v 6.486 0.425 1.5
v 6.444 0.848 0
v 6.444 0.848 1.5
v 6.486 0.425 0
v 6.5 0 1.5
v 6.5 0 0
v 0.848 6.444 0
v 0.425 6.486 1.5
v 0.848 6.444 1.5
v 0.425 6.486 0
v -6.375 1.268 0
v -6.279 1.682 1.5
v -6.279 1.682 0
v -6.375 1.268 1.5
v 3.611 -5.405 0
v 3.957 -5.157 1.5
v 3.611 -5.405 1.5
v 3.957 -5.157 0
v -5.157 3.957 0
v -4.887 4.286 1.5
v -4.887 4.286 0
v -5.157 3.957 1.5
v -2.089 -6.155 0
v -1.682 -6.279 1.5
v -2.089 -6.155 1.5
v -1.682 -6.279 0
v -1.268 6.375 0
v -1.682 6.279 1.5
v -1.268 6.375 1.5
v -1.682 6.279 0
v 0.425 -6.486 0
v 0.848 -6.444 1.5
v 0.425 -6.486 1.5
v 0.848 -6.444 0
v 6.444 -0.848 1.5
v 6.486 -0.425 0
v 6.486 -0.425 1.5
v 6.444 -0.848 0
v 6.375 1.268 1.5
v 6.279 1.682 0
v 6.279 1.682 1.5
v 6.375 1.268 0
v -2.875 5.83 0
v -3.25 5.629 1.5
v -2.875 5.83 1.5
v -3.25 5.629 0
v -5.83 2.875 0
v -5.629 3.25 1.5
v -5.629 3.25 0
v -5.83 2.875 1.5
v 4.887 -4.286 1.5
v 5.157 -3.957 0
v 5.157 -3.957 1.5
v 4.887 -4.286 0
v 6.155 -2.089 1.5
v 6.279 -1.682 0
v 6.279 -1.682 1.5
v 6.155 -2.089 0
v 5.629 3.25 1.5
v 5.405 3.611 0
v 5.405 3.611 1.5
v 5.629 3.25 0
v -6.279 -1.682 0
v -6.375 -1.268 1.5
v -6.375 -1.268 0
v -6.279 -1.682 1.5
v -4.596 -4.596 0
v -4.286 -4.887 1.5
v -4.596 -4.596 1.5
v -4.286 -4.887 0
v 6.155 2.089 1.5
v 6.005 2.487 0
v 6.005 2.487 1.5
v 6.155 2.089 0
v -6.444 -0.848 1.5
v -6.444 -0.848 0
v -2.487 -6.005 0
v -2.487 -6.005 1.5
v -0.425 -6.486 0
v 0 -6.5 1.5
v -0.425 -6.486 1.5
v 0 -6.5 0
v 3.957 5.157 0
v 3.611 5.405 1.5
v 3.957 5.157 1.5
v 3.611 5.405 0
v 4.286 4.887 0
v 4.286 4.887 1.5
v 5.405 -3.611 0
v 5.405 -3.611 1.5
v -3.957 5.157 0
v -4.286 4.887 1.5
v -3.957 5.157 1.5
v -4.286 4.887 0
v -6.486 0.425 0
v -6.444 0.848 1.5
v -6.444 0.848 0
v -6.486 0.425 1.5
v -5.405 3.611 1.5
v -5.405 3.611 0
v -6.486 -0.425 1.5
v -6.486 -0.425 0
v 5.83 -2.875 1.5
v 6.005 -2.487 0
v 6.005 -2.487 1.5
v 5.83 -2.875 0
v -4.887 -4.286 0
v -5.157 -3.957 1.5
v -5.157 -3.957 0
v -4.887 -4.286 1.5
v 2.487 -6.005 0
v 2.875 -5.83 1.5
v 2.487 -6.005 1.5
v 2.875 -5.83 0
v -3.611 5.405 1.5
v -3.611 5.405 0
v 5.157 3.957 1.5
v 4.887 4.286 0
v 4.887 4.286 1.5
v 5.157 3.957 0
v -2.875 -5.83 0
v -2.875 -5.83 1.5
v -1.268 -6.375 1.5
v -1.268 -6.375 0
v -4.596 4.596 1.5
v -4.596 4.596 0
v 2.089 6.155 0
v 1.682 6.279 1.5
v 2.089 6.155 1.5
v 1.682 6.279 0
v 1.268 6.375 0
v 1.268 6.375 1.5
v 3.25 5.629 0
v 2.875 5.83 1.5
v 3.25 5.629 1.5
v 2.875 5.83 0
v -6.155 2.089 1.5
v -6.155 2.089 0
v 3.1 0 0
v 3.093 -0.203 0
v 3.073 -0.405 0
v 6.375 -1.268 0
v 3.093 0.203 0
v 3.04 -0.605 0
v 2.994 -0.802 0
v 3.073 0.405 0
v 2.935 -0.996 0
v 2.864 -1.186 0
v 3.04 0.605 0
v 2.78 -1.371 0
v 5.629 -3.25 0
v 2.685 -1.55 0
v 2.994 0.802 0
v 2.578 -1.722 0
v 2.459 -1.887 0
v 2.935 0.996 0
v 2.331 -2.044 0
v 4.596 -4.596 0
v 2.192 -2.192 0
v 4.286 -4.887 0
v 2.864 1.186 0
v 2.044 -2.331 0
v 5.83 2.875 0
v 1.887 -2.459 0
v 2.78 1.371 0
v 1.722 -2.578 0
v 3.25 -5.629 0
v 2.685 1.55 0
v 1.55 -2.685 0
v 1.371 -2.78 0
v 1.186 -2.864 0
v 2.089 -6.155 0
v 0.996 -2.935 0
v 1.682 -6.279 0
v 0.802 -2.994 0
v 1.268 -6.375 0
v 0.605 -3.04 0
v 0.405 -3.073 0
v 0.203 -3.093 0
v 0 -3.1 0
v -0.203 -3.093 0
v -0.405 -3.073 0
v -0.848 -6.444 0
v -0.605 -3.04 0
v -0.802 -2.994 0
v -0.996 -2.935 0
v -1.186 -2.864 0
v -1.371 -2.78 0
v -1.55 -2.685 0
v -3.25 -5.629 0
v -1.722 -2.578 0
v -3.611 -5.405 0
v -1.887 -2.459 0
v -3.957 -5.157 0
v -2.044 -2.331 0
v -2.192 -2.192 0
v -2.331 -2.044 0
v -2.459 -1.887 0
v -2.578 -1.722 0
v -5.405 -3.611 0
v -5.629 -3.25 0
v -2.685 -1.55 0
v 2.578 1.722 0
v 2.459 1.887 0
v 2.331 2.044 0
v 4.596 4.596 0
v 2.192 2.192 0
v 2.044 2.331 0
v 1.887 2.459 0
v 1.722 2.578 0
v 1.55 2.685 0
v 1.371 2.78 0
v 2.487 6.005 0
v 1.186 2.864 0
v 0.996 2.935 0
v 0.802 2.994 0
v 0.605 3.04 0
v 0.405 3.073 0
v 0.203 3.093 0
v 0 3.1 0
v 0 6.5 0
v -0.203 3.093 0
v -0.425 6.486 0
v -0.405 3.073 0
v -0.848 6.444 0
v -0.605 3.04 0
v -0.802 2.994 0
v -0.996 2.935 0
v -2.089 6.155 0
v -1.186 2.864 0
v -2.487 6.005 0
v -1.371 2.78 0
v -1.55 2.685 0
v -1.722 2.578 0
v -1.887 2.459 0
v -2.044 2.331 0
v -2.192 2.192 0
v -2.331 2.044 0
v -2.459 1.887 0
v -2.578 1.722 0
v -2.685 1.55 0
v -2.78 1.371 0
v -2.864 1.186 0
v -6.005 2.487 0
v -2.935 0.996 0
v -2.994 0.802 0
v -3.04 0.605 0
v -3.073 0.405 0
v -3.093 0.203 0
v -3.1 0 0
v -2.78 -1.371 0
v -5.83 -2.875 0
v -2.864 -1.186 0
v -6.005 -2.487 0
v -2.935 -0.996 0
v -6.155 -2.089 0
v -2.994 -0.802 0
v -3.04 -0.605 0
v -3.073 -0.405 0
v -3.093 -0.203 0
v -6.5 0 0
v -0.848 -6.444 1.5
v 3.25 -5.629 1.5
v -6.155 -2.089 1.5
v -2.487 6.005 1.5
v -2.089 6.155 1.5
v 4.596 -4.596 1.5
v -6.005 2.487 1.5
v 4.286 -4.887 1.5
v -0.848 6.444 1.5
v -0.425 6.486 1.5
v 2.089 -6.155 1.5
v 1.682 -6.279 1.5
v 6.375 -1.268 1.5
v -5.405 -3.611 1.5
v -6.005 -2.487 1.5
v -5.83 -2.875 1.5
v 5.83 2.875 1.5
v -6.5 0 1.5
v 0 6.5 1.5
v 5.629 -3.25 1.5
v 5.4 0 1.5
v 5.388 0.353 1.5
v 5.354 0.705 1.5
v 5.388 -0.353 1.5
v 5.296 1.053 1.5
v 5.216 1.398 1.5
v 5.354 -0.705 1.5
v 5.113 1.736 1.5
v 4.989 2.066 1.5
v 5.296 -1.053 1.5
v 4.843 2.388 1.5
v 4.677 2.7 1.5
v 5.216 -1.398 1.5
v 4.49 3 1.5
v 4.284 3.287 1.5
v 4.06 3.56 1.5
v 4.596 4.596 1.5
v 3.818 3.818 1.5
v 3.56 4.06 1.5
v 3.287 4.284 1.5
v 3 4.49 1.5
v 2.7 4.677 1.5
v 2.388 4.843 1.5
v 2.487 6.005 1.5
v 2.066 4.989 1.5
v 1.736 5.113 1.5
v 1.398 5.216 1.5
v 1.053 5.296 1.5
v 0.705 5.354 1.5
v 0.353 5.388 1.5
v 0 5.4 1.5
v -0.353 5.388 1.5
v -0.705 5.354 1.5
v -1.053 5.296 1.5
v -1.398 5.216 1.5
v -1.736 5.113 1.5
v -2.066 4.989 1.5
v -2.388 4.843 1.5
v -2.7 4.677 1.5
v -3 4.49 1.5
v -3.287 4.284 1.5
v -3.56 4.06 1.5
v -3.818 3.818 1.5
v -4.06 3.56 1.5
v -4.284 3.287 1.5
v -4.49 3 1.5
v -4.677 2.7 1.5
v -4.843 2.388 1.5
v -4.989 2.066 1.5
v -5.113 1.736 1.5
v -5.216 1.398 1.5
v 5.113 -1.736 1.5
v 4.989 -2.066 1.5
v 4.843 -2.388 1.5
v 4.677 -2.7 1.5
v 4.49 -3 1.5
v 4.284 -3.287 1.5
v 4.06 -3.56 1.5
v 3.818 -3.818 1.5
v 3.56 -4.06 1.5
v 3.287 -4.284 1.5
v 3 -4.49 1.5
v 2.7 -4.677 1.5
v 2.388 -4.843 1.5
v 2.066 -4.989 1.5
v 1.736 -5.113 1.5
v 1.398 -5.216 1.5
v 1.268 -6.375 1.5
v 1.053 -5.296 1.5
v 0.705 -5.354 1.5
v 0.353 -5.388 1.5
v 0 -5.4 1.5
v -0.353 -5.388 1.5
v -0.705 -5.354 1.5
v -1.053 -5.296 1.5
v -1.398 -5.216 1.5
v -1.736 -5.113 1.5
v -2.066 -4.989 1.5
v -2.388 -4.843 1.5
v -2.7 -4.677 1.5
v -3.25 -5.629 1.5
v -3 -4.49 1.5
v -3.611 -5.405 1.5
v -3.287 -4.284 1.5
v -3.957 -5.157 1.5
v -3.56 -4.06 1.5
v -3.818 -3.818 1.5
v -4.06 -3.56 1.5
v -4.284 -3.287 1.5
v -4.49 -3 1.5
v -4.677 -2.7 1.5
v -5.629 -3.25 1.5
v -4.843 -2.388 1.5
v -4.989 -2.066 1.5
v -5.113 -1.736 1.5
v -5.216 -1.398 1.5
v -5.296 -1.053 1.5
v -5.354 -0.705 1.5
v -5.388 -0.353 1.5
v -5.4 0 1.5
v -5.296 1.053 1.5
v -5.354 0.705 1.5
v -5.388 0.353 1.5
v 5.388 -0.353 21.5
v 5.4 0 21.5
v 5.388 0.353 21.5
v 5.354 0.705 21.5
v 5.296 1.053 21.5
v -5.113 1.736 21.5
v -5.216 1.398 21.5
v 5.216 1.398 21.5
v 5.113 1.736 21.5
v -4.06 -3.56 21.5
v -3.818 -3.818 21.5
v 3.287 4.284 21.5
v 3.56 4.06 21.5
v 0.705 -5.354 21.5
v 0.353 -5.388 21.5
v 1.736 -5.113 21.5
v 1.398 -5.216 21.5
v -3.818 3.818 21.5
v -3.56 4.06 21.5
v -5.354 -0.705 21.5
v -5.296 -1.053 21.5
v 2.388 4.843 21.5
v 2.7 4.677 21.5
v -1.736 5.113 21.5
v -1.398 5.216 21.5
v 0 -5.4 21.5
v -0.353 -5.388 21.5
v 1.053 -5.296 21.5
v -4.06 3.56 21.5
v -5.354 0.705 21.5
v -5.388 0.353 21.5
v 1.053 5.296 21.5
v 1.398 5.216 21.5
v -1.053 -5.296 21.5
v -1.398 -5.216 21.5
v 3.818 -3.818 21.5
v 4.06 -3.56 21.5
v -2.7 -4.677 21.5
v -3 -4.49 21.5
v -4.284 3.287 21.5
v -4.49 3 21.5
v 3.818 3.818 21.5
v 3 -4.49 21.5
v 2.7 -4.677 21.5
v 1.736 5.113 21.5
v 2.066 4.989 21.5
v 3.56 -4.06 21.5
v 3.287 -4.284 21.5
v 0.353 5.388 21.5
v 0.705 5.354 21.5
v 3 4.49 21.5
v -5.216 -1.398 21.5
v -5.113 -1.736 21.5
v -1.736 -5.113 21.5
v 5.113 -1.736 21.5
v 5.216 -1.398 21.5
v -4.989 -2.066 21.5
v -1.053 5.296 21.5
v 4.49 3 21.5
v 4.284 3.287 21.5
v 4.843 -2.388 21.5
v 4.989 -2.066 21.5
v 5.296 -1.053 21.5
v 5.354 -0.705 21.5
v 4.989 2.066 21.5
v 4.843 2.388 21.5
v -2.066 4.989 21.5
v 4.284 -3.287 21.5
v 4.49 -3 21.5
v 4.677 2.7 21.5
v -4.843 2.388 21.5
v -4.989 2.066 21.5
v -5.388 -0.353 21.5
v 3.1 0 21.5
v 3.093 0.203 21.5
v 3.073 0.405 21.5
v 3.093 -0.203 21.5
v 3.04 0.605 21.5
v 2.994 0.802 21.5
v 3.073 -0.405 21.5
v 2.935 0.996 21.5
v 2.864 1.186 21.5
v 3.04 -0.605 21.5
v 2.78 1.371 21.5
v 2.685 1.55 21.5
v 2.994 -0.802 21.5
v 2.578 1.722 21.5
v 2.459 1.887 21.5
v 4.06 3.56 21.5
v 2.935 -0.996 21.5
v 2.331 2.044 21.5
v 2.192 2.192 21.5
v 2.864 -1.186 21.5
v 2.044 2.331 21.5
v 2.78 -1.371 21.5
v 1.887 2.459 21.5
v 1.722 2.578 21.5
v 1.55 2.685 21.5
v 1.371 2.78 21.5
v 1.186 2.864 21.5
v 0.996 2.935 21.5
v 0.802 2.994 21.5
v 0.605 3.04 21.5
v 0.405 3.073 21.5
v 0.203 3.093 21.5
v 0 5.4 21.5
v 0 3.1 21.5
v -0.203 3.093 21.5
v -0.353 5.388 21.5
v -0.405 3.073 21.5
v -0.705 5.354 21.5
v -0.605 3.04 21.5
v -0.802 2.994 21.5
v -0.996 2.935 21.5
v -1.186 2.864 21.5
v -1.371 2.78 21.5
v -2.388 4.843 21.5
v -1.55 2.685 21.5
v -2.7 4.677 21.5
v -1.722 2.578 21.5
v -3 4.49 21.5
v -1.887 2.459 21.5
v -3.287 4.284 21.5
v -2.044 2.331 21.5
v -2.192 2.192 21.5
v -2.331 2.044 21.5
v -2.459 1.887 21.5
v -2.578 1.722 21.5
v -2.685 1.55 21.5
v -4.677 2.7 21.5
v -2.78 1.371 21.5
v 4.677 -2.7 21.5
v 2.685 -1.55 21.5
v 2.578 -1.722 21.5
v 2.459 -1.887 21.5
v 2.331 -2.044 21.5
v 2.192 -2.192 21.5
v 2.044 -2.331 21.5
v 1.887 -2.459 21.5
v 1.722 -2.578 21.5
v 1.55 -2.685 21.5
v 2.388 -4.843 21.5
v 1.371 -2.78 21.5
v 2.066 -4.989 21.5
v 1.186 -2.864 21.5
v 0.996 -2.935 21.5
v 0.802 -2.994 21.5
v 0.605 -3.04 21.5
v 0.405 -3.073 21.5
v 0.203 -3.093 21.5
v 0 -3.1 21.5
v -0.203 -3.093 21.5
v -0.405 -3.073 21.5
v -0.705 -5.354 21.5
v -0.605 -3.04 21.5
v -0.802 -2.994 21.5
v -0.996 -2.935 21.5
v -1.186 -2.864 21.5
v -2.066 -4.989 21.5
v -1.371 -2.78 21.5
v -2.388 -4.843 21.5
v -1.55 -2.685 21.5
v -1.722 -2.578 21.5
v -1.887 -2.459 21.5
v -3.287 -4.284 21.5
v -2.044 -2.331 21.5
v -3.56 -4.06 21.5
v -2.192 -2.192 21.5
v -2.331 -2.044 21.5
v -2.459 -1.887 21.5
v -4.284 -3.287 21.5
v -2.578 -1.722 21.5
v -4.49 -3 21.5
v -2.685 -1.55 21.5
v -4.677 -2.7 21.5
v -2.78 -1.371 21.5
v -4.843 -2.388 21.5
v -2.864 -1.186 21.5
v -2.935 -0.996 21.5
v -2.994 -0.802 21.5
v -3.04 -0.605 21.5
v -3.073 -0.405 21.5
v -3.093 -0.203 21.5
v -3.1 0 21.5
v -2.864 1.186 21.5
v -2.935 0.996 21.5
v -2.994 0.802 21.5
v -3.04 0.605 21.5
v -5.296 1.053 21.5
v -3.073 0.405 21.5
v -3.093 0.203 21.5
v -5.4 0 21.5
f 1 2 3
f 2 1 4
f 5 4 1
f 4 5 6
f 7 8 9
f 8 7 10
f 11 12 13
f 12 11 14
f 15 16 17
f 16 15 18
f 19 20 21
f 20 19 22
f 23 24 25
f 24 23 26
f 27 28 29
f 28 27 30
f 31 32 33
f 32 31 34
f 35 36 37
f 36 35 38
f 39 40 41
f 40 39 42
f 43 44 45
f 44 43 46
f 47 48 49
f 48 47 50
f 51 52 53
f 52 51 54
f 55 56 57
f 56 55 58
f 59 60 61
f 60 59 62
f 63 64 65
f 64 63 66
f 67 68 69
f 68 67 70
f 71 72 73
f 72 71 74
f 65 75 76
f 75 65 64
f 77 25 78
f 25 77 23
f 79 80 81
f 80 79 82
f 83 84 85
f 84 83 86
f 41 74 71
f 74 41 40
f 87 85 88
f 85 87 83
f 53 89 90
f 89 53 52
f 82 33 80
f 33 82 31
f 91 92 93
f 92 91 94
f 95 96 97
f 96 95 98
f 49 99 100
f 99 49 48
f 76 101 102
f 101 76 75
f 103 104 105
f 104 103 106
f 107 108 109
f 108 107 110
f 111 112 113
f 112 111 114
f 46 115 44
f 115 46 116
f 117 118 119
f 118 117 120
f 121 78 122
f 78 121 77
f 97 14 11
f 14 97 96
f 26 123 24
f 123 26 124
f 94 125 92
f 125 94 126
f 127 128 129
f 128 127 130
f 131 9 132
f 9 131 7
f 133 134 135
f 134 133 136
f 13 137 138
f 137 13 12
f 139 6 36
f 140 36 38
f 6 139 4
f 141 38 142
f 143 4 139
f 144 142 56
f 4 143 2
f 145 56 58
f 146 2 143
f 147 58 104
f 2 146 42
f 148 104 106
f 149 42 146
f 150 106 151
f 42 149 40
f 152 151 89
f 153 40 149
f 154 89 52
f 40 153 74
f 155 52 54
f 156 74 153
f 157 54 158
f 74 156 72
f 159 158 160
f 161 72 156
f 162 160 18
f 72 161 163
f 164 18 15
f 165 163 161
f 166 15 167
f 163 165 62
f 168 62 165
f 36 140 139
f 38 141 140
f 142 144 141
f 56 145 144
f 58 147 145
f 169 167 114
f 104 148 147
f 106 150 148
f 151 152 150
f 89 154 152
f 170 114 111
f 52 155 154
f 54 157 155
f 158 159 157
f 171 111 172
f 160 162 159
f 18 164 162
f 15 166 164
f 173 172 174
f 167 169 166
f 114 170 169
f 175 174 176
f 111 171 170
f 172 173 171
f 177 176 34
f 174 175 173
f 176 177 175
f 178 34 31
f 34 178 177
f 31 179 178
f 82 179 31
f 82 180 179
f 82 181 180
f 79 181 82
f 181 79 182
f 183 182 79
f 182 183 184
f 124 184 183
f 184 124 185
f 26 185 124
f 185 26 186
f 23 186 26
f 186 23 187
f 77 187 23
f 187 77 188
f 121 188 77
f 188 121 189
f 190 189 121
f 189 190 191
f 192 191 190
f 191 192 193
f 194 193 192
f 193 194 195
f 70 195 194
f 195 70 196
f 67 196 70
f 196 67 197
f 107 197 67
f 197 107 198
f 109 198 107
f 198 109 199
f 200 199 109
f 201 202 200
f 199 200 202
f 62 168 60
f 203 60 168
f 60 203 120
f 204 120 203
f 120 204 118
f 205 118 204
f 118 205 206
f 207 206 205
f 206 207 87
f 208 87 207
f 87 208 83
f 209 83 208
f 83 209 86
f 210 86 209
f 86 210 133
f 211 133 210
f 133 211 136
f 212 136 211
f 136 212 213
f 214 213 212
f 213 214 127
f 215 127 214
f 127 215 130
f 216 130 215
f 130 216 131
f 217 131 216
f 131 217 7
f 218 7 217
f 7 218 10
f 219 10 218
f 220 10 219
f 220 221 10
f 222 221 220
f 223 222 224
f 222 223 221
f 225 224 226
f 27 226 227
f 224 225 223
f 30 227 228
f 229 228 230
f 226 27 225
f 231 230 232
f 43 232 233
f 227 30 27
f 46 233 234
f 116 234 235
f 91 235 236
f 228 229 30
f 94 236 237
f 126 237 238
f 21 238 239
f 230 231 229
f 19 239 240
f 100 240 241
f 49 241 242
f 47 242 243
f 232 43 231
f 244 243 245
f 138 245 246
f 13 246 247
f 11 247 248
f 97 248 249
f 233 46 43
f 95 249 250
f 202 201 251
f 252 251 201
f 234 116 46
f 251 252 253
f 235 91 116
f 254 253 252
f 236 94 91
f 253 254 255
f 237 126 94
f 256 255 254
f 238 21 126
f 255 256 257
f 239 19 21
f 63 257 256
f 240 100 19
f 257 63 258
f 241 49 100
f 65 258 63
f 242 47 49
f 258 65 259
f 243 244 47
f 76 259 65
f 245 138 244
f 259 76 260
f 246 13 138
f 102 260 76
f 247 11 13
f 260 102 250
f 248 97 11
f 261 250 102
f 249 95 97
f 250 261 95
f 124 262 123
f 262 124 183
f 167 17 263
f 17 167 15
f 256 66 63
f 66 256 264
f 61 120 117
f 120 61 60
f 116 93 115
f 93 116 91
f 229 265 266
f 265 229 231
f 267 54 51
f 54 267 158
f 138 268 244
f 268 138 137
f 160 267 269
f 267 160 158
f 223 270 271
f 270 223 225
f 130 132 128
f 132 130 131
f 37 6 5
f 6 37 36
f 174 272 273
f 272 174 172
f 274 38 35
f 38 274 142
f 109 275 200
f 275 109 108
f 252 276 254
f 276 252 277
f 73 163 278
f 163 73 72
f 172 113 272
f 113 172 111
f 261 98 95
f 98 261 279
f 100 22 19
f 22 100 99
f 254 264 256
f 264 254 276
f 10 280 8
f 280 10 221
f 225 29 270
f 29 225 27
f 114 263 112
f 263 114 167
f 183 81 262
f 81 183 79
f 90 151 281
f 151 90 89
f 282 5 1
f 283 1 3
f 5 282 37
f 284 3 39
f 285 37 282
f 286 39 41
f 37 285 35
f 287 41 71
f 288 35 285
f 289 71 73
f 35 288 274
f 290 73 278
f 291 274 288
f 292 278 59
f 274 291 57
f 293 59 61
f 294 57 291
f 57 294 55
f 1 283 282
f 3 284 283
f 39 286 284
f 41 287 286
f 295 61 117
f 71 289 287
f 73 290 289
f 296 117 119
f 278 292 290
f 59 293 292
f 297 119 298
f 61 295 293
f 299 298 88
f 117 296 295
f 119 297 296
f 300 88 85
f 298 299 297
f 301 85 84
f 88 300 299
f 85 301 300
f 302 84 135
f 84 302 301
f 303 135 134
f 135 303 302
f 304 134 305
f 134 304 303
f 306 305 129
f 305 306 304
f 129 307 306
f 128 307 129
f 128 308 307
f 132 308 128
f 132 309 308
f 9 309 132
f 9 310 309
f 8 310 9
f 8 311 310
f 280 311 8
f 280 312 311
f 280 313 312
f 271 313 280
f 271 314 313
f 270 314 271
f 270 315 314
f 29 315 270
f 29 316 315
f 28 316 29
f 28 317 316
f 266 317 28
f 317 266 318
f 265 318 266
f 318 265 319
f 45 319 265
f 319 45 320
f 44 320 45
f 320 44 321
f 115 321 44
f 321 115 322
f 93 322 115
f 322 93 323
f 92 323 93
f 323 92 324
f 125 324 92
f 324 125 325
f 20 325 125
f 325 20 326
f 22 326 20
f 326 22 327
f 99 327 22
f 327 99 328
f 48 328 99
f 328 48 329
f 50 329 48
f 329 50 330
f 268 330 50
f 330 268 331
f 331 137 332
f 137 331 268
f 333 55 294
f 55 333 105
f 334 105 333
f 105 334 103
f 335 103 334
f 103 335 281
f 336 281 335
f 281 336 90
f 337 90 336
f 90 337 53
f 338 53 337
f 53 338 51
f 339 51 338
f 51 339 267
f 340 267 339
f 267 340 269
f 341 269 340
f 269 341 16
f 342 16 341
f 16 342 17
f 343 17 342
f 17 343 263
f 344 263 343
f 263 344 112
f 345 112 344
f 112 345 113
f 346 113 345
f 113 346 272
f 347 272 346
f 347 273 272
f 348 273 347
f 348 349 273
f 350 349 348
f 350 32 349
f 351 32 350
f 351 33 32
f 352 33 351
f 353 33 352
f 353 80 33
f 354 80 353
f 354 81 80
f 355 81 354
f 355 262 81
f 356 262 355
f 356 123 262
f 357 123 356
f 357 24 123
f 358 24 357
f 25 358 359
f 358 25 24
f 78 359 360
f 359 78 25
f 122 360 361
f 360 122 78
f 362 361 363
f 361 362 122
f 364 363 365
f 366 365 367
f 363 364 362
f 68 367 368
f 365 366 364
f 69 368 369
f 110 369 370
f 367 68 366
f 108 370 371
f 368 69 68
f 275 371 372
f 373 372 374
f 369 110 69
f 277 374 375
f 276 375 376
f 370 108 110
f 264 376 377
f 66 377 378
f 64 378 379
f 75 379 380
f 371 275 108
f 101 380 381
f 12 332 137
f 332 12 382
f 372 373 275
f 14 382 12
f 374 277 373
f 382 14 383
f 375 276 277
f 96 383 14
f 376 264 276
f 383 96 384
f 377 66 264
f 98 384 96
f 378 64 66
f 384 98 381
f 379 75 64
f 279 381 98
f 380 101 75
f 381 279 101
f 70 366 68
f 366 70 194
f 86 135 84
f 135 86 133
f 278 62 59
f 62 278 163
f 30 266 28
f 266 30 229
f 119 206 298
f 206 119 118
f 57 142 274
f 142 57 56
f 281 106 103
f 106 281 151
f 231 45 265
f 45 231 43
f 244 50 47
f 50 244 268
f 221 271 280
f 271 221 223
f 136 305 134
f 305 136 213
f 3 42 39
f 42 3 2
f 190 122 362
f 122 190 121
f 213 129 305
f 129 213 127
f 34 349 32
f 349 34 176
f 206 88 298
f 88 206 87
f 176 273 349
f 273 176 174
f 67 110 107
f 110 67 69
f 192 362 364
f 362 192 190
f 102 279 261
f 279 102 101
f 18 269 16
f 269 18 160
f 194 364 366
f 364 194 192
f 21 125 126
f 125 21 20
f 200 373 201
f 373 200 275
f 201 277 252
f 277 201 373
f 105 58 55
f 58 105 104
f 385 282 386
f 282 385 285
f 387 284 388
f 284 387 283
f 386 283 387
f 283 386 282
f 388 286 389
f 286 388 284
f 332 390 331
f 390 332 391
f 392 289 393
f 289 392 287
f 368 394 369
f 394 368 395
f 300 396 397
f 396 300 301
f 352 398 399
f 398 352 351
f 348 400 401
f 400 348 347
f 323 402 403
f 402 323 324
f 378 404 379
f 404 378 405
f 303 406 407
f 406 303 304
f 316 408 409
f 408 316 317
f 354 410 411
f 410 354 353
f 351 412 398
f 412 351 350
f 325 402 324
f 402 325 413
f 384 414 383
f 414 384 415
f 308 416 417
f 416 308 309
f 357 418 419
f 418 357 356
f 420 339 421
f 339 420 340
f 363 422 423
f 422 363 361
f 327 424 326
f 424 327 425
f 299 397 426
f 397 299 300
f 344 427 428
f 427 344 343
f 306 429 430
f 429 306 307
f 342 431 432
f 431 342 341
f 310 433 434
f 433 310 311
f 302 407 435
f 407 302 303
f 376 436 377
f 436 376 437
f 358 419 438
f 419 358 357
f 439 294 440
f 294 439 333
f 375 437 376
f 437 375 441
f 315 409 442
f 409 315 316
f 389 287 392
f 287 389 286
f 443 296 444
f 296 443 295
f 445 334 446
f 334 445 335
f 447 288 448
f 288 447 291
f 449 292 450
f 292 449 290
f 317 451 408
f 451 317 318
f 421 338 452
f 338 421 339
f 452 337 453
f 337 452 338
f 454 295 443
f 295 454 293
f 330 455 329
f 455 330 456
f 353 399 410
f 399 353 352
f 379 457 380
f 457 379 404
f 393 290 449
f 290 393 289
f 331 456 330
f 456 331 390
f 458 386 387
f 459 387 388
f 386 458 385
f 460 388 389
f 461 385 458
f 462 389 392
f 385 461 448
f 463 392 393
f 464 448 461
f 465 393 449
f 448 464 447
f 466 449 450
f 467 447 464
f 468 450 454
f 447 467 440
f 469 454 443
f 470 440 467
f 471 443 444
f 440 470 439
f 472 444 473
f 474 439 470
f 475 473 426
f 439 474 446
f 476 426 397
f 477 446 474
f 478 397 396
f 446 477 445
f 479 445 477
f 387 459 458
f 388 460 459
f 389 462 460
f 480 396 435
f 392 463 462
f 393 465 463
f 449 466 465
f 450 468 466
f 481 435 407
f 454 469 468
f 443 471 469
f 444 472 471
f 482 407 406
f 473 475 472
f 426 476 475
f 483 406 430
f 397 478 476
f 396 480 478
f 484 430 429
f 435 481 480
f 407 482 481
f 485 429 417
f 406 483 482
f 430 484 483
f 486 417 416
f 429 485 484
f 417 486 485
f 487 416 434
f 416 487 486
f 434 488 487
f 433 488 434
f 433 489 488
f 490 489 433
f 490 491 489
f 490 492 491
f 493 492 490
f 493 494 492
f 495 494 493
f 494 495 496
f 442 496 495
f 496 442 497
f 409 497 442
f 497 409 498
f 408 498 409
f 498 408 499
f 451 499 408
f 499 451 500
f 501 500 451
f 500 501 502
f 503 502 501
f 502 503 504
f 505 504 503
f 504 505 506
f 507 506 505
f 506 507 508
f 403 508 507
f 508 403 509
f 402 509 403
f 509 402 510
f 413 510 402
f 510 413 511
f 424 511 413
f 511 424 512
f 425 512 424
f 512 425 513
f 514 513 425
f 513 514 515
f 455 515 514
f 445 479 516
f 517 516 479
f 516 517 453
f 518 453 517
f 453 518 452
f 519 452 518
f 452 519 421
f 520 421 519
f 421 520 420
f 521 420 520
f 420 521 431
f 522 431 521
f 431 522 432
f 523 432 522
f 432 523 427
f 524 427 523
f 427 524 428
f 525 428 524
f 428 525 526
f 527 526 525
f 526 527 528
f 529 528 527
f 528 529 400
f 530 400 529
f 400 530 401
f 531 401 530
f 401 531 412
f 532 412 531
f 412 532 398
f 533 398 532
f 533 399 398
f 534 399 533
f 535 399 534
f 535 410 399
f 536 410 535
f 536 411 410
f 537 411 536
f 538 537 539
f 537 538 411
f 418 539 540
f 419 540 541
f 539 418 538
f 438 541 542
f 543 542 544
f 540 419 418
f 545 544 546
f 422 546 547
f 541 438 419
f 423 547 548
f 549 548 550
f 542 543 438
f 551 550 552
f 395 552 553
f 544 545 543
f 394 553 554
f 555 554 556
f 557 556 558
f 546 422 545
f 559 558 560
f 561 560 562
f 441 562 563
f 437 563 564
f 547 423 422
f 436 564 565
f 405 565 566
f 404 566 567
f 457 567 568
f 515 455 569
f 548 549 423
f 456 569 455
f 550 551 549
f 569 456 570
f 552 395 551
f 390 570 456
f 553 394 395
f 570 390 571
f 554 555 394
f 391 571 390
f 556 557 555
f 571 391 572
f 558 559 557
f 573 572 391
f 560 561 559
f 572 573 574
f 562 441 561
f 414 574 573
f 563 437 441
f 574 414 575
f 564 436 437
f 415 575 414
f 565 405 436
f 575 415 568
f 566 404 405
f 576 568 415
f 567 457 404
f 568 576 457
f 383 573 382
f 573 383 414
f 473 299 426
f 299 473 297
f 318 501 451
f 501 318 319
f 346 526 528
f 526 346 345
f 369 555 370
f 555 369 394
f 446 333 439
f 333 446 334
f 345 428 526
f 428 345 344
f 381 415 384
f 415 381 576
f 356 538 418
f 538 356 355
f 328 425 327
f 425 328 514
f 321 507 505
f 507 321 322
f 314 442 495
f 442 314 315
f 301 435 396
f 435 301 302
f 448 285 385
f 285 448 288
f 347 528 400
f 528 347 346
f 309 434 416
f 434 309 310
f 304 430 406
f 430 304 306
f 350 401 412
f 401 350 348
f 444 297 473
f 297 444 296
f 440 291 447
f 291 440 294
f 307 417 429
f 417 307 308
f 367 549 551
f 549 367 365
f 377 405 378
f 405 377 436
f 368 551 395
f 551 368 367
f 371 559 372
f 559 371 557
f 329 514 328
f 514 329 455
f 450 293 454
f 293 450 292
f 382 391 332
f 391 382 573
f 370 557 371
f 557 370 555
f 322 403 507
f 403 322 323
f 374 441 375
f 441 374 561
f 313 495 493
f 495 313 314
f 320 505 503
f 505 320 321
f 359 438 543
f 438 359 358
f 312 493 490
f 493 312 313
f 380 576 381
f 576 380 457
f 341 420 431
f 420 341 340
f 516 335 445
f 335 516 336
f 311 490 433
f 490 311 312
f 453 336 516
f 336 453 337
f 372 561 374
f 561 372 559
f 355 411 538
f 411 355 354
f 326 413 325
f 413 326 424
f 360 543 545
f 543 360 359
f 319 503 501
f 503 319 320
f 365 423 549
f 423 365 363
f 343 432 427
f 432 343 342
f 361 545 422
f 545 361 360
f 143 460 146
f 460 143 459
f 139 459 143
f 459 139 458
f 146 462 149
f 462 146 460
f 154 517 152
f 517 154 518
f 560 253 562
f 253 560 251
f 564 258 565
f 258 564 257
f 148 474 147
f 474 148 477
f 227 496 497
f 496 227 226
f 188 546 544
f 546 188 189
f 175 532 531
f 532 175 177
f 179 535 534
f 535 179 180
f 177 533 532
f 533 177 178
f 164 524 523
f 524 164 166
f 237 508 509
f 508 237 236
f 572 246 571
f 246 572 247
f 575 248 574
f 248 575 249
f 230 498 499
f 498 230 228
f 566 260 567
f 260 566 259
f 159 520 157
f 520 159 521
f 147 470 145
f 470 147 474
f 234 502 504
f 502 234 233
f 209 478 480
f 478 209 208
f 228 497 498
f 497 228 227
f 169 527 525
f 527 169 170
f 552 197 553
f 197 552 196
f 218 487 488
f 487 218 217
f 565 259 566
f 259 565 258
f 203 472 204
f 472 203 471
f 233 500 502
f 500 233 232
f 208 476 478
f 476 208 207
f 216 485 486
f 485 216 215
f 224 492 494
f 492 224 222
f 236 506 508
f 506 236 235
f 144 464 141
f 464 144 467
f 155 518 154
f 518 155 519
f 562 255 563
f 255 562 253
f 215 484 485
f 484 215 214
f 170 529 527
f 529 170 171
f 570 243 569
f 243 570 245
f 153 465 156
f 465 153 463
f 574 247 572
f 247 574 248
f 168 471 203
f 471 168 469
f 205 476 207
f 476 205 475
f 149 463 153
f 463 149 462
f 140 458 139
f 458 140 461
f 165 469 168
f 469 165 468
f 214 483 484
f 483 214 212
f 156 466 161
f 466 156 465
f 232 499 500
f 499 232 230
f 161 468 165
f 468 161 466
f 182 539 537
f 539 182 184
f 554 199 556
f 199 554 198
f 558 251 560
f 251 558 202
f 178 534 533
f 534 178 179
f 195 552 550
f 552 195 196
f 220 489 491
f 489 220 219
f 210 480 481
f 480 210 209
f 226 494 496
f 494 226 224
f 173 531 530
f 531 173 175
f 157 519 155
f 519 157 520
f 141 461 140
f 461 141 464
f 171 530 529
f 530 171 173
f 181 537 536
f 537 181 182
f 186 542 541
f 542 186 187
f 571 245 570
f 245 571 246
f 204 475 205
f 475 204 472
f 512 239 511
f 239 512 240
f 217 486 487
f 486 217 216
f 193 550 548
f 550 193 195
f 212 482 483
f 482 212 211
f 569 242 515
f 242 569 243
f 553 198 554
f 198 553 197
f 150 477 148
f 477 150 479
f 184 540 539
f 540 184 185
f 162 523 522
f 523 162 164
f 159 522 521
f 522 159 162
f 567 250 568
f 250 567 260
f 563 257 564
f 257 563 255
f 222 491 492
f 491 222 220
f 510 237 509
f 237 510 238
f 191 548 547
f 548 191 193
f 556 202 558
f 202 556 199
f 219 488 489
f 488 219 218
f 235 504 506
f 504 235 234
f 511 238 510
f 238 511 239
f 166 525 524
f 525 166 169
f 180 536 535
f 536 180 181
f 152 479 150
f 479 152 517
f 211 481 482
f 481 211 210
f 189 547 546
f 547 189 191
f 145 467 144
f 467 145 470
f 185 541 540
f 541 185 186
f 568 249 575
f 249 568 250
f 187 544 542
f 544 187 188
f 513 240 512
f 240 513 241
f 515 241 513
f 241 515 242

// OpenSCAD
// PCR tube adapter sleeve: fits 0.2 mL tubes into 1.5 mL rack holes
// Print orientation: collar on bed (z = 0), sleeve body rises to z = 21.5

// ---- Dimensions (mm) ----
collar_d        = 13;    // collar outer diameter
collar_h        = 1.5;   // collar thickness (z = 0 to 1.5)
sleeve_od       = 10.8;  // sleeve body outer diameter
sleeve_top_z    = 21.5;  // top of sleeve body
bore_d          = 6.2;   // through-bore diameter
eps             = 0.5;   // cutter overshoot past faces

$fn = 96;

difference() {
    union() {
        // Collar
        cylinder(d = collar_d, h = collar_h);
        // Sleeve body (slightly overlapping collar for a clean union)
        translate([0, 0, collar_h - 0.01])
            cylinder(d = sleeve_od, h = sleeve_top_z - collar_h + 0.01);
    }
    // Full-height bore
    translate([0, 0, -eps])
        cylinder(d = bore_d, h = sleeve_top_z + 2 * eps);
}
